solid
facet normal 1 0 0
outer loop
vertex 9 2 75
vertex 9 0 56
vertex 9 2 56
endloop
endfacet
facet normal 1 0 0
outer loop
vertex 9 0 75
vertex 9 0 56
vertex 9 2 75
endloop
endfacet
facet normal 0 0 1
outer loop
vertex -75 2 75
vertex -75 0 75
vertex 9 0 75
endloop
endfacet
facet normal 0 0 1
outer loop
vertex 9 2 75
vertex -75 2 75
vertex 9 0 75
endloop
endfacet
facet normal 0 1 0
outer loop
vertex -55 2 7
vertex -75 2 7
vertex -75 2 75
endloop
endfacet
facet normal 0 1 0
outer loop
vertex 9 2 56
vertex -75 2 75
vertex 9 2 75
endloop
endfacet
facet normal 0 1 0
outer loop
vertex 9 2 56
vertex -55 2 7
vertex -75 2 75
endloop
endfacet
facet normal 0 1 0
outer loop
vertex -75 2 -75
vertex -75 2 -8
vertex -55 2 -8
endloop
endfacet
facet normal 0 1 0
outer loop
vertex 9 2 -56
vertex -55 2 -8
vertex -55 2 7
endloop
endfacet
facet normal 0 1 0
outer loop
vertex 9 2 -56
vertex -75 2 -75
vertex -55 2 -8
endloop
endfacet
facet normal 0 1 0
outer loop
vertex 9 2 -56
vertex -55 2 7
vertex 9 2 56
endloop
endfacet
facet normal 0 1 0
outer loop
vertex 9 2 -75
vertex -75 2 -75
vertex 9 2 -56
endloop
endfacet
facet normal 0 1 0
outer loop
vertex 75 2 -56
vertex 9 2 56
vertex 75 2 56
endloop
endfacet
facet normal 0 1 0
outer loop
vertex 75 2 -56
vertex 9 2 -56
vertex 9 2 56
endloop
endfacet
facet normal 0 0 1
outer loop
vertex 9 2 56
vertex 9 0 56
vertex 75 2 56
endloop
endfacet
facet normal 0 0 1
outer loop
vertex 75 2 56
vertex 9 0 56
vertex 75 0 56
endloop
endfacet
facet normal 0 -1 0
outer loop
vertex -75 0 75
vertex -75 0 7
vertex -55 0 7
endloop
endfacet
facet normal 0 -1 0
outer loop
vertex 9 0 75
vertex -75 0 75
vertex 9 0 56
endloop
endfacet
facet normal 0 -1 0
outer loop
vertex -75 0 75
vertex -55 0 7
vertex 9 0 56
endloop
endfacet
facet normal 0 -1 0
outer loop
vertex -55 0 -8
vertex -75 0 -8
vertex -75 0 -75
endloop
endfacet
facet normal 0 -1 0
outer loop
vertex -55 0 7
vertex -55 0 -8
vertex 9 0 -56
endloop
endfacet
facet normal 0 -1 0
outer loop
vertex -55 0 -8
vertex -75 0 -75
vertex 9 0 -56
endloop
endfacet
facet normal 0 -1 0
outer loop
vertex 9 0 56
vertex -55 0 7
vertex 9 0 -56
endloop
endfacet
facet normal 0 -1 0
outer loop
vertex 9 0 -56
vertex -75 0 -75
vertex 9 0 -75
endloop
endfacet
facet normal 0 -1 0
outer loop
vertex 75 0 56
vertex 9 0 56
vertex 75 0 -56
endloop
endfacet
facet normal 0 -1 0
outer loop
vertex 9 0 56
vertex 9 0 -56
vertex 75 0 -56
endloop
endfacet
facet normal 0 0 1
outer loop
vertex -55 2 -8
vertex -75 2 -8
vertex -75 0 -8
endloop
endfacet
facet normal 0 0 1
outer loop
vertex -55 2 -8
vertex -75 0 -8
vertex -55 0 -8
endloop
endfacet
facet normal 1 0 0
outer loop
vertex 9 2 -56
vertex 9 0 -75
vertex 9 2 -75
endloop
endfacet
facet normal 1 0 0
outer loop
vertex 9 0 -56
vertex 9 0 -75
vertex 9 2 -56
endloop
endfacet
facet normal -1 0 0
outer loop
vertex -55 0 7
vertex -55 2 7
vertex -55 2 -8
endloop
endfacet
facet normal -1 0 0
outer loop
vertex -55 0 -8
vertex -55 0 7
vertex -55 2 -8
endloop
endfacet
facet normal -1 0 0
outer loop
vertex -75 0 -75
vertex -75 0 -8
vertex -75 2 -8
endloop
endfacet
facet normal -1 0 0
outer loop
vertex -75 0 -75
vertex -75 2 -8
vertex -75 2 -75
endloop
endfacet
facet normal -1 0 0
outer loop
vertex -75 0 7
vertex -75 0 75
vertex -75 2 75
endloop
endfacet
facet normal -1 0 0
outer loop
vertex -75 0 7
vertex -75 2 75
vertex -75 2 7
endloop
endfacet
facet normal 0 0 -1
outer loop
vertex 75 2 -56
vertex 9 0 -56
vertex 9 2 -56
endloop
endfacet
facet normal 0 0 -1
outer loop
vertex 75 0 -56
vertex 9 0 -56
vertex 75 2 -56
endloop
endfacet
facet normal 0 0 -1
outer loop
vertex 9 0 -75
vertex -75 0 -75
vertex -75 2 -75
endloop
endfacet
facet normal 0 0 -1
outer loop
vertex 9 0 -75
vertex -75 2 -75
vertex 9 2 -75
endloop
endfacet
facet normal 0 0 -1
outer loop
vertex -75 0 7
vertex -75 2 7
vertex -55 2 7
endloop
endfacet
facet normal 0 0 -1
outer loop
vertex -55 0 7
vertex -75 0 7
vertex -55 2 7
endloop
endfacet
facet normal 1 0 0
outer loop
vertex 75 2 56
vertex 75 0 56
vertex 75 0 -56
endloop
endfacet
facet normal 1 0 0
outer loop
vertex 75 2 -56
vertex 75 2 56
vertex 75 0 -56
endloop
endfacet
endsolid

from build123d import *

# Parameters (mm, degrees)
SKETCH1_W           = 150
SKETCH1_H           = 150
BOSS_EXTRUDE1_DEPTH = 2
CUT_EXTRUDE2_REACH  = 4
SKETCH4_W           = 20
SKETCH4_H           = 15
CUT_EXTRUDE3_REACH  = 4
SKETCH7_W           = 66
SKETCH7_H           = 19


with BuildPart() as part:
    # Sketch1 → Boss-Extrude1 (new body)
    with BuildSketch(Plane(origin=(0, 0, 0), x_dir=(1, 0, 0), z_dir=(0, 1, 0))):
        Rectangle(SKETCH1_W, SKETCH1_H)
    extrude(amount=BOSS_EXTRUDE1_DEPTH)

    # Sketch4 → Cut-Extrude2 (cut, up to next)
    with BuildSketch(Plane(origin=(0, 2, 0), x_dir=(1, 0, 0), z_dir=(0, 1, 0)), mode=Mode.PRIVATE) as cut_extrude2_sk1:
        with Locations((-65, 0.5)):
            Rectangle(SKETCH4_W, SKETCH4_H)
    cut_extrude2_tool1 = extrude(cut_extrude2_sk1.sketch, amount=-CUT_EXTRUDE2_REACH, mode=Mode.PRIVATE) & part.part
    add(cut_extrude2_tool1.solids().sort_by_distance((-65, 2, -0.5))[0], mode=Mode.SUBTRACT)

    # Sketch7 → Cut-Extrude3 (cut, up to next)
    with BuildSketch(Plane.XZ, mode=Mode.PRIVATE) as cut_extrude3_sk1:
        with Locations((42, 65.5)):
            Rectangle(SKETCH7_W, SKETCH7_H)
    cut_extrude3_tool1 = extrude(cut_extrude3_sk1.sketch, amount=-CUT_EXTRUDE3_REACH, mode=Mode.PRIVATE) & part.part
    add(cut_extrude3_tool1.solids().sort_by_distance((42, 0, 65.5))[0], mode=Mode.SUBTRACT)
    # Sketch7 → Cut-Extrude3 (cut, up to next)
    with BuildSketch(Plane.XZ, mode=Mode.PRIVATE) as cut_extrude3_sk2:
        with Locations((42, -65.5)):
            Rectangle(SKETCH7_W, SKETCH7_H)
    cut_extrude3_tool2 = extrude(cut_extrude3_sk2.sketch, amount=-CUT_EXTRUDE3_REACH, mode=Mode.PRIVATE) & part.part
    add(cut_extrude3_tool2.solids().sort_by_distance((42, 0, -65.5))[0], mode=Mode.SUBTRACT)


solid = part.part
